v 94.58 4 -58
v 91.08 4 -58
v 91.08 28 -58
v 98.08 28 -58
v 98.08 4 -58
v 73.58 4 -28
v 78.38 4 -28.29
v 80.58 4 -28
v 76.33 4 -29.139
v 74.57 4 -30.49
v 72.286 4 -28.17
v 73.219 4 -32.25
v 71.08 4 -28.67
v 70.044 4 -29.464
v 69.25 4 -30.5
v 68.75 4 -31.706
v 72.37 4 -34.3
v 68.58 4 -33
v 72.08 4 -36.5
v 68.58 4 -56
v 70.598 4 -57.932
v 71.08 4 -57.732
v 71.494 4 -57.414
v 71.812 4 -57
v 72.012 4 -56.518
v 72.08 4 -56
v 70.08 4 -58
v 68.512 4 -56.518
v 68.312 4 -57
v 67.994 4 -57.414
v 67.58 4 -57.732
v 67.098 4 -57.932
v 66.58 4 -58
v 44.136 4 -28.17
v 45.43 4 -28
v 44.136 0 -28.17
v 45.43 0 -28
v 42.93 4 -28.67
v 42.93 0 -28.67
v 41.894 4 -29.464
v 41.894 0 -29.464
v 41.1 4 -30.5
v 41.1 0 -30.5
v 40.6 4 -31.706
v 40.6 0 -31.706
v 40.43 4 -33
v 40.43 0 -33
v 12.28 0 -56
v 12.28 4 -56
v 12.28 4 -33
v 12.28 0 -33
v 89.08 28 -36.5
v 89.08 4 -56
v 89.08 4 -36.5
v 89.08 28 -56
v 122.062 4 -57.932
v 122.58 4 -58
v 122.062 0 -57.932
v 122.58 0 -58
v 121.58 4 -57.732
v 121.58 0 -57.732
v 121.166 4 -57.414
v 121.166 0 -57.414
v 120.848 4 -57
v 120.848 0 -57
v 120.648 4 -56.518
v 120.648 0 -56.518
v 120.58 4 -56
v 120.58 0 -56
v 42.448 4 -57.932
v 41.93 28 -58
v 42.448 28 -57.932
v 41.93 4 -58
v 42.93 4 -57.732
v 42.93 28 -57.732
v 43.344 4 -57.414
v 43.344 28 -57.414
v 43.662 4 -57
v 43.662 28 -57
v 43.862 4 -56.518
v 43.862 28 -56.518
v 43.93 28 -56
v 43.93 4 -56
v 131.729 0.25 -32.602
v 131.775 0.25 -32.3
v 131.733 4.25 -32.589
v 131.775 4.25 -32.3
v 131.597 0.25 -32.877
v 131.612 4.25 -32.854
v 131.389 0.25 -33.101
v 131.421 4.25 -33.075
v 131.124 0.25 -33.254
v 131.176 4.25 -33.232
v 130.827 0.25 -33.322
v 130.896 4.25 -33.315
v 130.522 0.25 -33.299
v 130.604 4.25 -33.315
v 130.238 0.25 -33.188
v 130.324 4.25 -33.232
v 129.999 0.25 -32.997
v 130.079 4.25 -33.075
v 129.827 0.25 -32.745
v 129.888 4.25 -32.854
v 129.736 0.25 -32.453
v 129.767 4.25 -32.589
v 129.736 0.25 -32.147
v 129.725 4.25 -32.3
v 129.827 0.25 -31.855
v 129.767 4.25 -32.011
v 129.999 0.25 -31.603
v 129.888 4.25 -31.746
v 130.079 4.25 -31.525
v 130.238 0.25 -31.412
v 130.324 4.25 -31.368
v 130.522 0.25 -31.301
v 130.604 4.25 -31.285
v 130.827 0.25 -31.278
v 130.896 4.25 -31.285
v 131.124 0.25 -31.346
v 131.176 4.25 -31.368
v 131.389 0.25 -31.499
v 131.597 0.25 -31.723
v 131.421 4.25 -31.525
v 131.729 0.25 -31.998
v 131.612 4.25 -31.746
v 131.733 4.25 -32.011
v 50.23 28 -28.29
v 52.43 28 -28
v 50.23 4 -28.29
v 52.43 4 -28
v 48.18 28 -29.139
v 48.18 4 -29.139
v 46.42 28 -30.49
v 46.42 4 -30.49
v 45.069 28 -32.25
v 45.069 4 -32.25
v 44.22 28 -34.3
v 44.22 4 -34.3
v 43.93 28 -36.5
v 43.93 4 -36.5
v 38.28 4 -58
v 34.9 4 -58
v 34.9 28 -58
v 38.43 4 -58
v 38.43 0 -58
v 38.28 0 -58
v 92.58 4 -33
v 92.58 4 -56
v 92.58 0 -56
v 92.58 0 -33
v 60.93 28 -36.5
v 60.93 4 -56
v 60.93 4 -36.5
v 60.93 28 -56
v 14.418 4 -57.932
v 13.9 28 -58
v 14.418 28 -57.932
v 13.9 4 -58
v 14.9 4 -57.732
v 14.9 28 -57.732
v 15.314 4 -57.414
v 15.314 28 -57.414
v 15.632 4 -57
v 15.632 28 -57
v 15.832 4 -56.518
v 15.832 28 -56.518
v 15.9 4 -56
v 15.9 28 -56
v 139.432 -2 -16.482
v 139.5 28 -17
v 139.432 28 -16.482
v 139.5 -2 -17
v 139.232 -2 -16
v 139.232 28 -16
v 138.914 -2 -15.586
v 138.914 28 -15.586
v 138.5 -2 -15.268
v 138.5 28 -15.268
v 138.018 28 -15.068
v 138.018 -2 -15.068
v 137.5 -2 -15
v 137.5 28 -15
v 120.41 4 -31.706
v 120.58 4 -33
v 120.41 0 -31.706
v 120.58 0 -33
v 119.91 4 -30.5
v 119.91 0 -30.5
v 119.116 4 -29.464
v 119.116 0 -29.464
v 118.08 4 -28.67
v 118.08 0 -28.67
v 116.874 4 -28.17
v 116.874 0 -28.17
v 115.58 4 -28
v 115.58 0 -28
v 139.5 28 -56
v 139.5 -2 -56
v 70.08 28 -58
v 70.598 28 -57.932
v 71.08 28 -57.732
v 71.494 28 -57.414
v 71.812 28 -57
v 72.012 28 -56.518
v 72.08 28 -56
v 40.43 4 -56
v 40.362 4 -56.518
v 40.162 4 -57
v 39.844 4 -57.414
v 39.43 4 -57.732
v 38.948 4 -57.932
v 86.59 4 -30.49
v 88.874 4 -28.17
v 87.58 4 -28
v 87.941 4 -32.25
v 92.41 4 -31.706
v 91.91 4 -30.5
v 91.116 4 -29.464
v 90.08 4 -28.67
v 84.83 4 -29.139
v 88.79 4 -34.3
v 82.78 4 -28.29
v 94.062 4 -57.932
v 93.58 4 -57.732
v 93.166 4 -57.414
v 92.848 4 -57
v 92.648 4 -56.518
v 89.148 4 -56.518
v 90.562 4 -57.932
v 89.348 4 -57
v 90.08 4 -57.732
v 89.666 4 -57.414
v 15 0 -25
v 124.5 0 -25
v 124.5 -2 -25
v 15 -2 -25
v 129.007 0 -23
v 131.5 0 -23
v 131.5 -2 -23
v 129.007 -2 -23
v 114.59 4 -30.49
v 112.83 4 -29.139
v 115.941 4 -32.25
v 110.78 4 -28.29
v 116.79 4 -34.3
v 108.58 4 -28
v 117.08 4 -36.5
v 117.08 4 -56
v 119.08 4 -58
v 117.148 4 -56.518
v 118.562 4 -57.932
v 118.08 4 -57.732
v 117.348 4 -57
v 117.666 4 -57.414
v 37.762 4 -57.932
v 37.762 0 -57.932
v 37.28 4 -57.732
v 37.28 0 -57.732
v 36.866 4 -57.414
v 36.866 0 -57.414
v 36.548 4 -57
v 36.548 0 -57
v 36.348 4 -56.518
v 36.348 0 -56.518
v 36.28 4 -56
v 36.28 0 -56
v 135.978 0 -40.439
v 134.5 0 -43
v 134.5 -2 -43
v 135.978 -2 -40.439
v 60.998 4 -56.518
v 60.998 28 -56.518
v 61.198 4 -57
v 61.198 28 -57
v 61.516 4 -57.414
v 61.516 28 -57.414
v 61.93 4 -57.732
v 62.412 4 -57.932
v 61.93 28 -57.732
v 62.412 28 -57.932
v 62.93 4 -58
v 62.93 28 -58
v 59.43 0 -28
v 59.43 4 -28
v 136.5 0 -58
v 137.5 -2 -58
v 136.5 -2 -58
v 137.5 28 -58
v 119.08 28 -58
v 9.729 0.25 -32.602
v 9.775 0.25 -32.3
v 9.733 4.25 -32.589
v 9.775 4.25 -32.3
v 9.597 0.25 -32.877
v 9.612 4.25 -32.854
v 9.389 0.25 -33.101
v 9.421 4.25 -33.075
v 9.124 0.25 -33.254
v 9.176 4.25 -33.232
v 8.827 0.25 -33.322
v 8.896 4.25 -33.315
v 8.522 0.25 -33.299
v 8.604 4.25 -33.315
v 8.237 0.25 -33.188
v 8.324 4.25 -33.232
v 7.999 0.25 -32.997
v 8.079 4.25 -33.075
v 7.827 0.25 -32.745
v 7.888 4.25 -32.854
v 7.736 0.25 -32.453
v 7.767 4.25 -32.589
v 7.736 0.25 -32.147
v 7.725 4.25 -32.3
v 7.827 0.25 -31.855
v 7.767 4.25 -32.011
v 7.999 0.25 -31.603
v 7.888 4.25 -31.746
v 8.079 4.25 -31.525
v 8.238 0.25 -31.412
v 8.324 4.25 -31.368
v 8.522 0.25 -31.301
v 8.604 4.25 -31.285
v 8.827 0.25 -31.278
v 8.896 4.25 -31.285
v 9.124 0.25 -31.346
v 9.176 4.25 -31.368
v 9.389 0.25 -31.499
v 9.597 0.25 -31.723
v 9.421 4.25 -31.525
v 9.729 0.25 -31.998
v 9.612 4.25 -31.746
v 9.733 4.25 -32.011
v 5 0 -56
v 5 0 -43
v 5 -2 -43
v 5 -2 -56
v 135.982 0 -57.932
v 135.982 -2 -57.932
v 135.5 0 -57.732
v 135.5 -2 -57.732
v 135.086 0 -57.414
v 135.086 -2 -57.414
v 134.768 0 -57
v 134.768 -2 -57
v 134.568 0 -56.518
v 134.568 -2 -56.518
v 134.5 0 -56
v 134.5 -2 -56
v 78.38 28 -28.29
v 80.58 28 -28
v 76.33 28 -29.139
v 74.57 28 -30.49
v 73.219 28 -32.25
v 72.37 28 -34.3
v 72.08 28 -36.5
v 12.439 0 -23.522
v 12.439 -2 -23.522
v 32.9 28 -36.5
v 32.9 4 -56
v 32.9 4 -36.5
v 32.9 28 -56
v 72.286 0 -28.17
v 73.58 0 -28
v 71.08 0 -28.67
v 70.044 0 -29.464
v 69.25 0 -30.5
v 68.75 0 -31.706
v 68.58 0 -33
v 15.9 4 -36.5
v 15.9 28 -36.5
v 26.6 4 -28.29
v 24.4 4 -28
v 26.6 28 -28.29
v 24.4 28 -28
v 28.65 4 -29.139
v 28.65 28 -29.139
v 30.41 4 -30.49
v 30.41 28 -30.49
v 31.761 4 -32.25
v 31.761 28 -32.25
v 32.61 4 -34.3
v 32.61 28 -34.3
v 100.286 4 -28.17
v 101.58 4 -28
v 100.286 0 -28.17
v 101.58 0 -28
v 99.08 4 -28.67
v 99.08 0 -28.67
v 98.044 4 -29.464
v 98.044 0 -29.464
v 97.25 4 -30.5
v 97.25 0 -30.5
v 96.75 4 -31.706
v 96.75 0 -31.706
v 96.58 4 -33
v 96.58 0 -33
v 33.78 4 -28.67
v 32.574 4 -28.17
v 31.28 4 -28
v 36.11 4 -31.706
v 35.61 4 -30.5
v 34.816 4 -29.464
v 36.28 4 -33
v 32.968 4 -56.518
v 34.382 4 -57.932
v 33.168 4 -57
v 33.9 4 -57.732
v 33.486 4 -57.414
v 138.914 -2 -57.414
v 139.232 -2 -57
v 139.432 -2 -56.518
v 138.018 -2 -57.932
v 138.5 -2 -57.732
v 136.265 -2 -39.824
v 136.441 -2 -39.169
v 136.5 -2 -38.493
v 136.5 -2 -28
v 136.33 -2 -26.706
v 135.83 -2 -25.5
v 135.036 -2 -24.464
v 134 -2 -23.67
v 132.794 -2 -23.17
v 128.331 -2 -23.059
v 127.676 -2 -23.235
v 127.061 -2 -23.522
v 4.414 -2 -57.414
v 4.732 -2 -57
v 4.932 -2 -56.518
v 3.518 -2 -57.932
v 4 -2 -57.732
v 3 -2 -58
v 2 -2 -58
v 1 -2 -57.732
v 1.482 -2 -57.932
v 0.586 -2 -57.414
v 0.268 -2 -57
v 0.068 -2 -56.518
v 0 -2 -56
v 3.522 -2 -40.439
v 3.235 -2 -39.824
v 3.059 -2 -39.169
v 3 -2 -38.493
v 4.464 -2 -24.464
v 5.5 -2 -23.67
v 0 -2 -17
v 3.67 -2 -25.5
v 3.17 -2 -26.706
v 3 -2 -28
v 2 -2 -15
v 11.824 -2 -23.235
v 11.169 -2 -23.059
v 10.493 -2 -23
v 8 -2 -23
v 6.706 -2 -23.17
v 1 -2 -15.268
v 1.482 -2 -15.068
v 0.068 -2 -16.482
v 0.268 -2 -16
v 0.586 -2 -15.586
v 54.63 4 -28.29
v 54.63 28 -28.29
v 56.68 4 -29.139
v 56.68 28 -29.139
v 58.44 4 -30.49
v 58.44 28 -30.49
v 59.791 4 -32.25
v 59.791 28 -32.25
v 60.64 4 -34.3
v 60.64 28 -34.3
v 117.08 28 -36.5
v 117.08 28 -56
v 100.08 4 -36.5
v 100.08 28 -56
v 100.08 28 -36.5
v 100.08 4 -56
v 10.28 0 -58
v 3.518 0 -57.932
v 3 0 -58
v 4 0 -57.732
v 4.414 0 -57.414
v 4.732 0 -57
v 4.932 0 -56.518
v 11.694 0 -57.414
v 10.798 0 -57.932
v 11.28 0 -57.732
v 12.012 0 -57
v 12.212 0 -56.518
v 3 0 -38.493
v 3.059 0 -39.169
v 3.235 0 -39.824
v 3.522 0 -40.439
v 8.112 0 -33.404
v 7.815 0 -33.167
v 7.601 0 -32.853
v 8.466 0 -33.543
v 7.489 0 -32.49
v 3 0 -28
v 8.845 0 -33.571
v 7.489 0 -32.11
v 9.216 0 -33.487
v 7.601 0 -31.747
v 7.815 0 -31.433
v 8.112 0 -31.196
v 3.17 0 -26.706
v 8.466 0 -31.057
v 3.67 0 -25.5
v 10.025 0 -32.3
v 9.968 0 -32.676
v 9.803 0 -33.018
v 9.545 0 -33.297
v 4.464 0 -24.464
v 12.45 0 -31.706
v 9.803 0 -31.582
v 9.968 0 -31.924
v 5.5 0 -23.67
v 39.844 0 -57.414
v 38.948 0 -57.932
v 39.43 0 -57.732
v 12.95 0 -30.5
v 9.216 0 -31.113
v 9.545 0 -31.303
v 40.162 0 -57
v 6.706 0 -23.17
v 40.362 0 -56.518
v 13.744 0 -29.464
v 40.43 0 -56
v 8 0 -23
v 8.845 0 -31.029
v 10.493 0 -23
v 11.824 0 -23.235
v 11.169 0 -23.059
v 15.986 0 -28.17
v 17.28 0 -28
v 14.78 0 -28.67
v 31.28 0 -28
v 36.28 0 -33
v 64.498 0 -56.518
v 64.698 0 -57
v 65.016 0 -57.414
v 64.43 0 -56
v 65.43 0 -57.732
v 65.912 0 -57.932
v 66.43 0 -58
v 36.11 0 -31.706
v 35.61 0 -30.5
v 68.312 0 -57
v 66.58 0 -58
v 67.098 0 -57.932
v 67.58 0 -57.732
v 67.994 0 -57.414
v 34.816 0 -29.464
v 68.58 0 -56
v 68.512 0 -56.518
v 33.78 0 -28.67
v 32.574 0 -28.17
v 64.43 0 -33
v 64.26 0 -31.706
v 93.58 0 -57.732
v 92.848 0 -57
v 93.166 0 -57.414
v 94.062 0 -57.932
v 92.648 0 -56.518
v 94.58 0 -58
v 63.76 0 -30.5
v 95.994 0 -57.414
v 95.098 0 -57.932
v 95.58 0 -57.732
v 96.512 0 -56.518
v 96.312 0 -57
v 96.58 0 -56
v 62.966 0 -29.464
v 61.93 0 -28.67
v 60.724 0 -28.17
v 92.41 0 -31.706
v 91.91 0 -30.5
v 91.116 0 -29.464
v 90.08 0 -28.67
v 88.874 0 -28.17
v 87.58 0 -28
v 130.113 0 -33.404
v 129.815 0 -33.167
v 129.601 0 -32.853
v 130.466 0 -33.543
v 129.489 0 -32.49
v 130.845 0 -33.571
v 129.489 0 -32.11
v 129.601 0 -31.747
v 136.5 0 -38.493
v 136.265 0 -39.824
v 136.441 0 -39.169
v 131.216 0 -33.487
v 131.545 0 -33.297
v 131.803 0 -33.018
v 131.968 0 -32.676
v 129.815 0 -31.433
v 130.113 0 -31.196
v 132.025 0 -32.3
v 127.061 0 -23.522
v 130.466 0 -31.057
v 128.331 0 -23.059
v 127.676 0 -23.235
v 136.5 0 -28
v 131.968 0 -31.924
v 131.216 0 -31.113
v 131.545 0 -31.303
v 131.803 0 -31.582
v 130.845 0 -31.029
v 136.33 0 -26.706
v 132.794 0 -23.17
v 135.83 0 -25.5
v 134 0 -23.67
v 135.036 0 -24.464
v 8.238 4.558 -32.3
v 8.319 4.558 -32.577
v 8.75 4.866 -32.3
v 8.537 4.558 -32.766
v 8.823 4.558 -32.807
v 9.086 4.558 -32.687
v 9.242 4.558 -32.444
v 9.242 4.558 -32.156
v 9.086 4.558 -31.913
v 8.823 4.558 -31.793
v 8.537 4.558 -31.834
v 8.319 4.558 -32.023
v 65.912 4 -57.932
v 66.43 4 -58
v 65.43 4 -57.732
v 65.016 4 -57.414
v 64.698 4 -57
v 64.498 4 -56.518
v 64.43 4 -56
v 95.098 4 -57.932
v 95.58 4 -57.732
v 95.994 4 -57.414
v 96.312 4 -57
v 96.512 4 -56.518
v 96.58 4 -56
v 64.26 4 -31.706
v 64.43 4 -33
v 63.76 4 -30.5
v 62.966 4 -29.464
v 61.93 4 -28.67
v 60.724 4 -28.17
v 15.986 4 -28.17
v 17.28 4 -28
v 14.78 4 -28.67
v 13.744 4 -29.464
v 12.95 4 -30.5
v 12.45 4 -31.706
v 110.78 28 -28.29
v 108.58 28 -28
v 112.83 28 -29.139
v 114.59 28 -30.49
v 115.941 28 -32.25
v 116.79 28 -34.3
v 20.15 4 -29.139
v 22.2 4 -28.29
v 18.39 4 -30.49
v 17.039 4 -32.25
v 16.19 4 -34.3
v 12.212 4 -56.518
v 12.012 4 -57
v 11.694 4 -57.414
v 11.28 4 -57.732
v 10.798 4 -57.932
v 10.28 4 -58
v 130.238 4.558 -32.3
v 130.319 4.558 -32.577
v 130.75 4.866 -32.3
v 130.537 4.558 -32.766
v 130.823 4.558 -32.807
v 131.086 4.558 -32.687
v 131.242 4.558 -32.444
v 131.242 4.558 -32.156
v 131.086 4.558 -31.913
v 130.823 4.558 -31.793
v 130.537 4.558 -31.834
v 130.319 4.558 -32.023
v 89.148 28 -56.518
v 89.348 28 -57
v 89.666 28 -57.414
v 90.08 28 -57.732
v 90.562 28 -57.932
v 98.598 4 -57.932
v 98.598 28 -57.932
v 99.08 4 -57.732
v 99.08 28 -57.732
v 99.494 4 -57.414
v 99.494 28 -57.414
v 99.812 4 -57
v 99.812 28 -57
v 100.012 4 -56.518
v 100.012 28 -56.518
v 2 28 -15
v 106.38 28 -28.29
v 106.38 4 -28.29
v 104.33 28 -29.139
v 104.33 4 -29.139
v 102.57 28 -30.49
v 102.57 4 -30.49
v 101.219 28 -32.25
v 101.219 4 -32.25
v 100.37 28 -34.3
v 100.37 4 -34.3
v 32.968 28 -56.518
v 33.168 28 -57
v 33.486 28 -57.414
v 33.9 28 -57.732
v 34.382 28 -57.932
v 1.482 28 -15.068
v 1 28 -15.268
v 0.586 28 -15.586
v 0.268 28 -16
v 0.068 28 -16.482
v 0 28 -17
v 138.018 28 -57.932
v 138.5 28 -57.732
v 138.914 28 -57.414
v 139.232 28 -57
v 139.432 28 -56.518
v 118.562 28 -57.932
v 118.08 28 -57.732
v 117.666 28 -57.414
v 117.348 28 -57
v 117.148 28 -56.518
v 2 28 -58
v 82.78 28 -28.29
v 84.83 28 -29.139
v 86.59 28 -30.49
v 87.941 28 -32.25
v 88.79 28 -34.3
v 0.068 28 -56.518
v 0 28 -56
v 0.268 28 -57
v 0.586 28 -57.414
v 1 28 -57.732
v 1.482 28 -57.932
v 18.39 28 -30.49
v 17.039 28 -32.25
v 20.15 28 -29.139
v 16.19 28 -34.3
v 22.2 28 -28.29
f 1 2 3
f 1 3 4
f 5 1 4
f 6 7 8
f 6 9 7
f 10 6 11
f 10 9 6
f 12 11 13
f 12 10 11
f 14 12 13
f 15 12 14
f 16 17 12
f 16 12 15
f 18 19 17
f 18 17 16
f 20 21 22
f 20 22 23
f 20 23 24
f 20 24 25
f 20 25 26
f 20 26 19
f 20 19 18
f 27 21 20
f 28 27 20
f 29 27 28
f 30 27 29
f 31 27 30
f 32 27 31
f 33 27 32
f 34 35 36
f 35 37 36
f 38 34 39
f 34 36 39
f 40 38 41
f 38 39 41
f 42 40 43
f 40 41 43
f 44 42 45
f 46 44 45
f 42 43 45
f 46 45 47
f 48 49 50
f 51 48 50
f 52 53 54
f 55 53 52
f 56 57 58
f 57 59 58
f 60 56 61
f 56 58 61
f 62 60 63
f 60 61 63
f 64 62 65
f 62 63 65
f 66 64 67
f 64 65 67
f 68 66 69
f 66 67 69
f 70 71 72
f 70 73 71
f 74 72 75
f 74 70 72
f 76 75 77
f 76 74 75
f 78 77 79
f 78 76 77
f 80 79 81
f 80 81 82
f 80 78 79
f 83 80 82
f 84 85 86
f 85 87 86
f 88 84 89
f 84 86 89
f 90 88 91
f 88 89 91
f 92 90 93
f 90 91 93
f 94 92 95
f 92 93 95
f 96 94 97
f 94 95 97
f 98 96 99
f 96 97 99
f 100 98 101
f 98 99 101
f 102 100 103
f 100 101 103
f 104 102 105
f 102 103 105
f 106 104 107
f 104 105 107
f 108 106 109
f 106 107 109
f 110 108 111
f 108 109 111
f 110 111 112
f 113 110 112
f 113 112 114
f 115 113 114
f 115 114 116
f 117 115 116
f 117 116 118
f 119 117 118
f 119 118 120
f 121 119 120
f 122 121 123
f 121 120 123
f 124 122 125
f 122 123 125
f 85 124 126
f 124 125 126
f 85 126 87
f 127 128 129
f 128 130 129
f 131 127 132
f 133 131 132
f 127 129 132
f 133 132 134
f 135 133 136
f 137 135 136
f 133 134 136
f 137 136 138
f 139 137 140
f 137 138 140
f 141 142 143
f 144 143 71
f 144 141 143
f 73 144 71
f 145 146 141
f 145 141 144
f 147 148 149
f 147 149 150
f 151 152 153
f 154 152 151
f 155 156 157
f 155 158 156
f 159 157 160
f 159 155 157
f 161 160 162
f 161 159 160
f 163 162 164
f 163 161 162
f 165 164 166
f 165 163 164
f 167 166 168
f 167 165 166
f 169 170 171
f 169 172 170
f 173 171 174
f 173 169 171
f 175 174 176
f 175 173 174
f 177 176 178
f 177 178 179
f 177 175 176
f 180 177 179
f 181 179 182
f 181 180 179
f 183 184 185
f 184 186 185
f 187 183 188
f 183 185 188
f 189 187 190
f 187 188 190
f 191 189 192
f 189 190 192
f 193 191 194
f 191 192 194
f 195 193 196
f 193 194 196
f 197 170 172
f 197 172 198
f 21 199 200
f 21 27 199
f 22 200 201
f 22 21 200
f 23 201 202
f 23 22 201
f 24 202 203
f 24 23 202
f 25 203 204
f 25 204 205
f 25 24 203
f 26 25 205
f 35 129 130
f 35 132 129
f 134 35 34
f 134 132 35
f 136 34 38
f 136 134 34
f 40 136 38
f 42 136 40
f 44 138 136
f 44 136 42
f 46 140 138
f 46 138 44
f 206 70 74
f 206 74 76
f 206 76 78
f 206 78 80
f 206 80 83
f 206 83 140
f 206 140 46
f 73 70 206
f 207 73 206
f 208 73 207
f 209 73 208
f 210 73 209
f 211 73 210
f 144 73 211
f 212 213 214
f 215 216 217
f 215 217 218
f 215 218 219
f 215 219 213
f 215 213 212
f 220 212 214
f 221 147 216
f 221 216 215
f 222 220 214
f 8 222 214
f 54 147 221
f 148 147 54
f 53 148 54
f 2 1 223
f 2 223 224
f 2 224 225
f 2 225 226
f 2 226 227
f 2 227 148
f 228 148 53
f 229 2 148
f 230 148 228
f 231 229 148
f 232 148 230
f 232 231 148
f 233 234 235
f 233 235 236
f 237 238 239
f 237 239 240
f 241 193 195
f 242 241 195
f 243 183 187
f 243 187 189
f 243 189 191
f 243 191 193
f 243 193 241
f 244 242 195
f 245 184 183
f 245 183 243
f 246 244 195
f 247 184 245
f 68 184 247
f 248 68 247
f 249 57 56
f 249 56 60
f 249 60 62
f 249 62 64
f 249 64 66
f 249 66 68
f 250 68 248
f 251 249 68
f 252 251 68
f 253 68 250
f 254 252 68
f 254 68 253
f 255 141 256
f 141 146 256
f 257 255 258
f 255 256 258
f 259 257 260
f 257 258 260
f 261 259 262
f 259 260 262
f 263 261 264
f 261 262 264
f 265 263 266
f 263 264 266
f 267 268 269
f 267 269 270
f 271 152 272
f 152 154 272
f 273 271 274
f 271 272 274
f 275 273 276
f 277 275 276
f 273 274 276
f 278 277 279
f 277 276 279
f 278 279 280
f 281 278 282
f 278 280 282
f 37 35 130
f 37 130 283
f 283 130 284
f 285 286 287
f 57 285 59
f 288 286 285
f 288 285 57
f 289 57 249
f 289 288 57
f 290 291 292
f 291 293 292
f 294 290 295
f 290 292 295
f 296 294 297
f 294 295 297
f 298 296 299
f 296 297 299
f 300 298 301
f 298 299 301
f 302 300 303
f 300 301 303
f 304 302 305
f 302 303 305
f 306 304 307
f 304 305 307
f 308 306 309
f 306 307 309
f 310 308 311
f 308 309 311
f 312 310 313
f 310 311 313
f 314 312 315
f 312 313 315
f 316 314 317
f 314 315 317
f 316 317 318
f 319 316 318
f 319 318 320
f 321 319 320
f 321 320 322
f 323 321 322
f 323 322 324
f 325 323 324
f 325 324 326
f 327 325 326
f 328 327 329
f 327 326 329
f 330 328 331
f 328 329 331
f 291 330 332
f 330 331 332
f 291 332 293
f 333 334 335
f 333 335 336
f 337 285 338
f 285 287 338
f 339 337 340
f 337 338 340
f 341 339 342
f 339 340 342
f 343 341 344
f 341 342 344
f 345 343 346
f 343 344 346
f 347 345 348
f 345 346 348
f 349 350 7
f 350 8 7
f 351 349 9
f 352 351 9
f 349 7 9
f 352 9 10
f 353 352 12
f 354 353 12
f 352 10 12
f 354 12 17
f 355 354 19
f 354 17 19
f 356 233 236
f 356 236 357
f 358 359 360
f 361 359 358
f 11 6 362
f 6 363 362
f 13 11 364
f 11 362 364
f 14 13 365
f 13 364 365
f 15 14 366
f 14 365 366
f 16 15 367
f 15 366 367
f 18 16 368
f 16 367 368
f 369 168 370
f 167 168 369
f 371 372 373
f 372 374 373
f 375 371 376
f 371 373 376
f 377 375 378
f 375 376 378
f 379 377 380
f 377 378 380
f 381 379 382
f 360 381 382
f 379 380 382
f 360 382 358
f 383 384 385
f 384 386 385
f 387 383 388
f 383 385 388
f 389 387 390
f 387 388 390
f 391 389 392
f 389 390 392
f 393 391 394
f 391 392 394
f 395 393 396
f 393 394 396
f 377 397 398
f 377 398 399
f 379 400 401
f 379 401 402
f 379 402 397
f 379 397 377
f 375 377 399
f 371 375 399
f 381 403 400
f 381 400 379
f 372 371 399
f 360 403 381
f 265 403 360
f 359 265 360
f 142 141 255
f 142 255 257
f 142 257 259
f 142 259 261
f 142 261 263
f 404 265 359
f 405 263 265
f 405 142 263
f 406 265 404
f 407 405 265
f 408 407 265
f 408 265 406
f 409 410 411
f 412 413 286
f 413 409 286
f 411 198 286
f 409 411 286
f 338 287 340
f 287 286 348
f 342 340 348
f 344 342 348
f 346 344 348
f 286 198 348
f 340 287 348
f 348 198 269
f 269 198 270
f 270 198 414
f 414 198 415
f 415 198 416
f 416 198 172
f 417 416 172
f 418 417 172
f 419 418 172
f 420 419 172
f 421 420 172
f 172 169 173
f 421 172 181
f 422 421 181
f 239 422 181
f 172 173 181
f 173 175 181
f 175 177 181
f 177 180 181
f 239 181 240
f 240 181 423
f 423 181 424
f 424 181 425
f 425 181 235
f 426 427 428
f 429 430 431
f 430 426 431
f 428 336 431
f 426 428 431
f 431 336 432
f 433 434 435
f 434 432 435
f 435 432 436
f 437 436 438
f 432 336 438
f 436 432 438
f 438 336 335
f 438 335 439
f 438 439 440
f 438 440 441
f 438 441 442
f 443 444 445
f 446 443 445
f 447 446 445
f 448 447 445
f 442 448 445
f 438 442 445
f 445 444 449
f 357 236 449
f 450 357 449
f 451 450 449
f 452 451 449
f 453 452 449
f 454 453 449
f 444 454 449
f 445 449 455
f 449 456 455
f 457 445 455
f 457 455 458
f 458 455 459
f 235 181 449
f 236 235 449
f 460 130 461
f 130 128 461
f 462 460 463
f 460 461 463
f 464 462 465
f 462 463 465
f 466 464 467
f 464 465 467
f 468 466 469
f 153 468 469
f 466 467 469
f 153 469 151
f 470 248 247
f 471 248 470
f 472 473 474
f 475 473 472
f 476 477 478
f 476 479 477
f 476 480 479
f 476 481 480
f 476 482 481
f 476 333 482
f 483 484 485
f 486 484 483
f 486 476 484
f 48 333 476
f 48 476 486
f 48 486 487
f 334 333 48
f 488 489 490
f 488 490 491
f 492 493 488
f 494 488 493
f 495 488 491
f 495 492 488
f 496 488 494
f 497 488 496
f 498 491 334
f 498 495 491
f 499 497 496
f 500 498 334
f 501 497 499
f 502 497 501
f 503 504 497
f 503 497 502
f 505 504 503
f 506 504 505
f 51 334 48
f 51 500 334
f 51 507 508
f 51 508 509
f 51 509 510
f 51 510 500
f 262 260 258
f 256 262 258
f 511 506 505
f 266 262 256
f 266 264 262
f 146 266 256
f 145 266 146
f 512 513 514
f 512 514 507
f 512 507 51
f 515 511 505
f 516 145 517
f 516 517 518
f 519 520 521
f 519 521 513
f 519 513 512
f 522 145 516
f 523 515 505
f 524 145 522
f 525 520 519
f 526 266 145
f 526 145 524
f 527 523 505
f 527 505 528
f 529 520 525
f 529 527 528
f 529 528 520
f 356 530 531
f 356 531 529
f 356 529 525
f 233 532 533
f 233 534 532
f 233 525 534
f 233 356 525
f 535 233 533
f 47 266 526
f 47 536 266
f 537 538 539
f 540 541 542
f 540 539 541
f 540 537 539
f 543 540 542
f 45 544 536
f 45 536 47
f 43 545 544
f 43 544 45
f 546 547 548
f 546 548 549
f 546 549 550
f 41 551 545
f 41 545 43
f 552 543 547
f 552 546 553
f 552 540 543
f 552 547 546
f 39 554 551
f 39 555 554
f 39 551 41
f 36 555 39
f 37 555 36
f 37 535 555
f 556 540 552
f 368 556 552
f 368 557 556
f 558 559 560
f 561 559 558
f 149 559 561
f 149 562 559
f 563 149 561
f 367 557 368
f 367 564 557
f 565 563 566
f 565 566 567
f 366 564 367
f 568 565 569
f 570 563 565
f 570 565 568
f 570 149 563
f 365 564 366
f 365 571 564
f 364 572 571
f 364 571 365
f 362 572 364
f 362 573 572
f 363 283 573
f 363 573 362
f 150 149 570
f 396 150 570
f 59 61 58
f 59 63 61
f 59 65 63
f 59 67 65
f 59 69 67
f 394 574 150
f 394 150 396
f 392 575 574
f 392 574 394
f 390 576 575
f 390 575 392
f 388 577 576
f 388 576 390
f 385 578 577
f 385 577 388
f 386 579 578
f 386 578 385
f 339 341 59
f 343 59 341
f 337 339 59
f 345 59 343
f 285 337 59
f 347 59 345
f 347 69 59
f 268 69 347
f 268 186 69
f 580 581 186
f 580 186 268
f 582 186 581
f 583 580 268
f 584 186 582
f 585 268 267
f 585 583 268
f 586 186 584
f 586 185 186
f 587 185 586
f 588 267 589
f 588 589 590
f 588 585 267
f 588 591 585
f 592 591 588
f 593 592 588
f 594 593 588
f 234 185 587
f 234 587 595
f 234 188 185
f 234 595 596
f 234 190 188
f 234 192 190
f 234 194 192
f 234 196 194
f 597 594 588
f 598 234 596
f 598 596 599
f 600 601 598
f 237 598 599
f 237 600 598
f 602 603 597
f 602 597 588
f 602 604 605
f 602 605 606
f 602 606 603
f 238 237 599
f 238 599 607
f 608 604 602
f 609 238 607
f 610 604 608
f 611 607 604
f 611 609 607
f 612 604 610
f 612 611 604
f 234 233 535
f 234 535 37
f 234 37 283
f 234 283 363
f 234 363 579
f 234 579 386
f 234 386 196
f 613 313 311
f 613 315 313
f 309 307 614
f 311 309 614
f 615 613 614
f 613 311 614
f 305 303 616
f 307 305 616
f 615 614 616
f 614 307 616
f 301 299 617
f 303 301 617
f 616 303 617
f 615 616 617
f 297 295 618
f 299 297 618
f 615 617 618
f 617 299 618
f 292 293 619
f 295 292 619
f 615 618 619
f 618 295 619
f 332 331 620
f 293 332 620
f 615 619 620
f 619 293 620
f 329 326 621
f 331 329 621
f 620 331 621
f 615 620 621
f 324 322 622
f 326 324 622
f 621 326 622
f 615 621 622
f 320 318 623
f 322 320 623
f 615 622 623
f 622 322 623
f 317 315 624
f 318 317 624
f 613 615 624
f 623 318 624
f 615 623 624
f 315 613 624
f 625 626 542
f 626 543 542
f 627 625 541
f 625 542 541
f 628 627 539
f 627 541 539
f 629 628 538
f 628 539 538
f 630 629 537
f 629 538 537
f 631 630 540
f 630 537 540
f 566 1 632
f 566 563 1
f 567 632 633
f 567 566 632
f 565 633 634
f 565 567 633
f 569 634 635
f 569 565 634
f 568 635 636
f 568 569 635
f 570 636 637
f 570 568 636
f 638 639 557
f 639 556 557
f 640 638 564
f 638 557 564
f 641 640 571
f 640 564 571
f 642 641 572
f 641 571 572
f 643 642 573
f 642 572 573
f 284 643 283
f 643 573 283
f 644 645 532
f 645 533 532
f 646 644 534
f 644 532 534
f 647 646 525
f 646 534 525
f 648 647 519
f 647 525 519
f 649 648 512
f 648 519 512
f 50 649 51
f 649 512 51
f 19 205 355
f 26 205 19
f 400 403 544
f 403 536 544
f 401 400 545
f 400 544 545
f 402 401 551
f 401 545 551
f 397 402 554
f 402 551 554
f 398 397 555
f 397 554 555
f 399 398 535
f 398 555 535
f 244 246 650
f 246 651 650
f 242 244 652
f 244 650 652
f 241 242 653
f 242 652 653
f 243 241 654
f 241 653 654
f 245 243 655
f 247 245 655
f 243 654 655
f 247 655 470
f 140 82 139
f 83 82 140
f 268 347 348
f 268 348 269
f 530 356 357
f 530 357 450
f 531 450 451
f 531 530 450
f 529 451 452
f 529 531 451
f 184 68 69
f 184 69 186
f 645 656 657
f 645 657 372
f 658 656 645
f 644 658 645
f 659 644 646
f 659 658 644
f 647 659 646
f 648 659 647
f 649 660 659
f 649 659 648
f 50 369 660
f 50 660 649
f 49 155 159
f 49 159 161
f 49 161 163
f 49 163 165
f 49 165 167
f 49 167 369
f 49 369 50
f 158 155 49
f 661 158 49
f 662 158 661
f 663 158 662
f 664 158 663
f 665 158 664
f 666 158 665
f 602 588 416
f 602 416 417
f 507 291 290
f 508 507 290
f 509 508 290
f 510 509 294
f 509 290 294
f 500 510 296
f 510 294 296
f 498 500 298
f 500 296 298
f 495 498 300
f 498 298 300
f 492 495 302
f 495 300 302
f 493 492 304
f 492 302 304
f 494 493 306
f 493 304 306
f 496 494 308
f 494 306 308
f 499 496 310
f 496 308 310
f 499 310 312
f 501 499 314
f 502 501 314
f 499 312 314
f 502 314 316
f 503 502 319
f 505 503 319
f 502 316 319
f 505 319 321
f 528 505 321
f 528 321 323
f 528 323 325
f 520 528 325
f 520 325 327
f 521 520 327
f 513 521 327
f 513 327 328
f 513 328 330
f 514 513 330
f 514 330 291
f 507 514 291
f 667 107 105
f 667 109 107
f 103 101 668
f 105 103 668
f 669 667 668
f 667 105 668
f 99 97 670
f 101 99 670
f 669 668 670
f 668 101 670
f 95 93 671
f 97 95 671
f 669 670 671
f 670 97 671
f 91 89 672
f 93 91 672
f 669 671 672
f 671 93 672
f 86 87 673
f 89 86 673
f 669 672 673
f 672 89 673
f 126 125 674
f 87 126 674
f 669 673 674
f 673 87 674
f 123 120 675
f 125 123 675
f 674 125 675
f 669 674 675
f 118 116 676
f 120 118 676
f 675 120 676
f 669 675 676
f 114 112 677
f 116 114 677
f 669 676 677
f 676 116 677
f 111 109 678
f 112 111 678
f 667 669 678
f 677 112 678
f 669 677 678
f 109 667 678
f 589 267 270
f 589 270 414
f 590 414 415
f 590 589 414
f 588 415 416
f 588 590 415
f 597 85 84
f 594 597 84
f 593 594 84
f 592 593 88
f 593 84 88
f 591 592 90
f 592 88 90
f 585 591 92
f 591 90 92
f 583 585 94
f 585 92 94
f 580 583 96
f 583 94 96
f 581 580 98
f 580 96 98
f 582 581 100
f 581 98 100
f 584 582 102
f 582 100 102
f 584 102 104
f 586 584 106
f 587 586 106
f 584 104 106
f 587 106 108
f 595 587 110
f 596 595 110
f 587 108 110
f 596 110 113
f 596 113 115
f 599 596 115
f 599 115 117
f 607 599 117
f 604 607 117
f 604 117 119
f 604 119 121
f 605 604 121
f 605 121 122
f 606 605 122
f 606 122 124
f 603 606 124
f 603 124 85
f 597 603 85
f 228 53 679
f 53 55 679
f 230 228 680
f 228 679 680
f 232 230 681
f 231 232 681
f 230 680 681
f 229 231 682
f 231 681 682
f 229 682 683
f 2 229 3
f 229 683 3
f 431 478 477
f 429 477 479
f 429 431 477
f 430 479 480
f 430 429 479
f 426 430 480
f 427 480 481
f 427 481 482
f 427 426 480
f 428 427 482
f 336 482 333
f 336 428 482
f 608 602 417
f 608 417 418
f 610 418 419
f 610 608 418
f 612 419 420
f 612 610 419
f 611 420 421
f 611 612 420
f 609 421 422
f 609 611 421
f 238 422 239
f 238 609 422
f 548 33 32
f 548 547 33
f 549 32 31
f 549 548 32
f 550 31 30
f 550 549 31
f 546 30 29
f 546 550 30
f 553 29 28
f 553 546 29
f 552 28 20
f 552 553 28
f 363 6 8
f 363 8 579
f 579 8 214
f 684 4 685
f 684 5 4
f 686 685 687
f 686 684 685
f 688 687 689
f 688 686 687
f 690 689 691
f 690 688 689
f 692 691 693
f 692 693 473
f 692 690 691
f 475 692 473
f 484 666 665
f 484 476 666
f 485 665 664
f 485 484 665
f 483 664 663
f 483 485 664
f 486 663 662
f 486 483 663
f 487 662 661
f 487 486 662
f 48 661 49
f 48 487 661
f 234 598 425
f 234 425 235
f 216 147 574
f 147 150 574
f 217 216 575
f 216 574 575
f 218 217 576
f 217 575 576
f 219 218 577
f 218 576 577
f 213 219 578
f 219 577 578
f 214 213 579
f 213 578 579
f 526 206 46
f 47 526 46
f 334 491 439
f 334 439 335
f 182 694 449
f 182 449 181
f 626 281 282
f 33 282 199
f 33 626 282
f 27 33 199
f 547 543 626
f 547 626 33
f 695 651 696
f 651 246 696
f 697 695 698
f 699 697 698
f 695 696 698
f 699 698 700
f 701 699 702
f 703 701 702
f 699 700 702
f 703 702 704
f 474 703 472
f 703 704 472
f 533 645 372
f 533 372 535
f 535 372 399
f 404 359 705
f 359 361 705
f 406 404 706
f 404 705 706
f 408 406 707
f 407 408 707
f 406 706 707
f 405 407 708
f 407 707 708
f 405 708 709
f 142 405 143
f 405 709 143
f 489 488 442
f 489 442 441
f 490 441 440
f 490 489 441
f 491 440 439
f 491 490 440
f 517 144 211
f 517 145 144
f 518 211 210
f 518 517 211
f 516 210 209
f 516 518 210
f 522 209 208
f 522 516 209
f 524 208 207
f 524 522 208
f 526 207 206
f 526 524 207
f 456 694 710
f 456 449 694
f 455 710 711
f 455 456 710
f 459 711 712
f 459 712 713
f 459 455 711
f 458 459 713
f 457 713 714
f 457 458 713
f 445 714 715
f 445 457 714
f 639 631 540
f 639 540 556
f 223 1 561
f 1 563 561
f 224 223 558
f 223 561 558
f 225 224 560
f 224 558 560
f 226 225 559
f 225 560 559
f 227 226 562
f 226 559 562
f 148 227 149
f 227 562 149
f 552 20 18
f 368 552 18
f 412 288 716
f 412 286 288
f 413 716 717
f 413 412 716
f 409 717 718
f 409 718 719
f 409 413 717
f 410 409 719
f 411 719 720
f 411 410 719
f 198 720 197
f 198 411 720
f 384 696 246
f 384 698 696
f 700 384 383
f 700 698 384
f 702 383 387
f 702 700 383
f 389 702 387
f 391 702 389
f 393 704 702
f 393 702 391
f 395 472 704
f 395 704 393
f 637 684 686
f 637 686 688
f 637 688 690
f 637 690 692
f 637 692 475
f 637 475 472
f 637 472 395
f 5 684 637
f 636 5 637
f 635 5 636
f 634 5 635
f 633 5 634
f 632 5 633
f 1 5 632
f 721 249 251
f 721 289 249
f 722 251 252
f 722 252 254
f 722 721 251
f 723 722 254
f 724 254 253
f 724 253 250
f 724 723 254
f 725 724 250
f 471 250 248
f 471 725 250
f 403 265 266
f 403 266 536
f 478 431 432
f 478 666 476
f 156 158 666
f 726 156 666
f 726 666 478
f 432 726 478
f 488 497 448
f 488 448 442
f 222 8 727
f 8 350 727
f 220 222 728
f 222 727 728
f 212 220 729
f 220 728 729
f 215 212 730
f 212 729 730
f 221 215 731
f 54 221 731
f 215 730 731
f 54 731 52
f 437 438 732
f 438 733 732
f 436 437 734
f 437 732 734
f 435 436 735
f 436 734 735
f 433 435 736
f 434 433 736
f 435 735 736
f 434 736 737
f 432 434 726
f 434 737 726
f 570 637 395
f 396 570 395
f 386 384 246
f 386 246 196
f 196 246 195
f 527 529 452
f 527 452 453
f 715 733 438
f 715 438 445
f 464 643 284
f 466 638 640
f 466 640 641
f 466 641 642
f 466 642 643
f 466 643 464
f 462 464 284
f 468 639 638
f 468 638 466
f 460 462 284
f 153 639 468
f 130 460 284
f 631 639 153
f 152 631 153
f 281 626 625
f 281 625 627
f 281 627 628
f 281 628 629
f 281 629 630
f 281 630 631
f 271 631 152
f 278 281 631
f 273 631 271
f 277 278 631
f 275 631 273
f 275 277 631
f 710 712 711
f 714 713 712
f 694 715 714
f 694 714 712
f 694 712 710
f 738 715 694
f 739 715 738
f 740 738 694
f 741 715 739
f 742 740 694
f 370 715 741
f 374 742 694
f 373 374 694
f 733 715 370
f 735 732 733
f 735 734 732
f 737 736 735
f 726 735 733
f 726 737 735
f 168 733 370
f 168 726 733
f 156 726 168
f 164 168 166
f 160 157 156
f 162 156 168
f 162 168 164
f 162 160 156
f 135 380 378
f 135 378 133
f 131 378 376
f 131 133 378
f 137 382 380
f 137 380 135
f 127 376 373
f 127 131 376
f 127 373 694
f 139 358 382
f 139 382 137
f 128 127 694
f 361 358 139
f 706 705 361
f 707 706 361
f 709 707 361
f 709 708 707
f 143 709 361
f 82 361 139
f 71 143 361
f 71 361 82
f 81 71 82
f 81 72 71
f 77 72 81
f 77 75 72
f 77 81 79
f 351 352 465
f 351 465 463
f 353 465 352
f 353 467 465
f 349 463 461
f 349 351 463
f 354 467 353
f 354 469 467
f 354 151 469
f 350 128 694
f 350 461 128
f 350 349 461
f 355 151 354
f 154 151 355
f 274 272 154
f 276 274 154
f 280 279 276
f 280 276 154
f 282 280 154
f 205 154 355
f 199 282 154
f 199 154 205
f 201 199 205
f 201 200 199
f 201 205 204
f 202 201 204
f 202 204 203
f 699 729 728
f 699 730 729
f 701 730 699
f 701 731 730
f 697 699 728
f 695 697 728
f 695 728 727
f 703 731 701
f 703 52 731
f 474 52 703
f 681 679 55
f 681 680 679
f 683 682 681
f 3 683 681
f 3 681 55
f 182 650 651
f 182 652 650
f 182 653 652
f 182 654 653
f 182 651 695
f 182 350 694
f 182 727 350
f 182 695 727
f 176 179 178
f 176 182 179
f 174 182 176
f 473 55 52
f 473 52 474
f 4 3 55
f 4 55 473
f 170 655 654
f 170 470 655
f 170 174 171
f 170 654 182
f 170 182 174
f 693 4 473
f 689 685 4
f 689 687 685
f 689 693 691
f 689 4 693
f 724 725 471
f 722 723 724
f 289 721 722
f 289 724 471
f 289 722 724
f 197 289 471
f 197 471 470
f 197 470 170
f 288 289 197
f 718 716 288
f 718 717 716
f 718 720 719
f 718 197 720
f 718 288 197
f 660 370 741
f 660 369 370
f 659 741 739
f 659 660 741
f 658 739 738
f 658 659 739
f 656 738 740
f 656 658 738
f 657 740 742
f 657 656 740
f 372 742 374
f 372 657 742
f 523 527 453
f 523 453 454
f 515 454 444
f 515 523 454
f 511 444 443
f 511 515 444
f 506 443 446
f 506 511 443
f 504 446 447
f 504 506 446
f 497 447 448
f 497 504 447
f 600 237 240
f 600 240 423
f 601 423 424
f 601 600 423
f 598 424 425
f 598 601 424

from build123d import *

# Parameters (mm, degrees)
SKIZZE1_W                        = 139.5
SKIZZE1_H                        = 58
AUFSATZ_LINEAR_AUSTRAGEN1_DEPTH  = 28
SCHNITT_LINEAR_AUSTRAGEN2_DEPTH  = 30
VERRUNDUNG1_R                    = 8.5
SKIZZE5_W                        = 7.28
SKIZZE5_H                        = 30
SKIZZE5_W_2                      = 4
SKIZZE5_W_3                      = 4.15
SKIZZE5_W_4                      = 13.92
AUFSATZ_LINEAR_AUSTRAGEN2_DEPTH  = 4
VERRUNDUNG2_R                    = 5
AUFSATZ_LINEAR_AUSTRAGEN3_DEPTH  = 2
VERRUNDUNG3_R                    = 2
VERRUNDUNG4_R                    = 2
SKIZZE7_W                        = 139.5
SKIZZE7_H                        = 15
SCHNITT_LINEAR_AUSTRAGEN5_DEPTH  = 155.026783385
VERRUNDUNG5_R                    = 2
M2_5_GEWINDEBOHRUNG1_D           = 2.05
M2_5_GEWINDEBOHRUNG1_DEPTH       = 4.25
M2_5_GEWINDEBOHRUNG1_CSINK_D     = 2.55
M2_5_GEWINDEBOHRUNG1_CSINK_ANGLE = 90
M2_5_GEWINDEBOHRUNG1_TIP         = 0.615882135


with BuildPart() as part:
    # Skizze1 → Aufsatz-Linear austragen1 (new body)
    with BuildSketch(Plane(origin=(0, 0, 0), x_dir=(1, 0, 0), z_dir=(0, 1, 0))):
        with Locations((69.75, 29)):
            Rectangle(SKIZZE1_W, SKIZZE1_H)
    extrude(amount=AUFSATZ_LINEAR_AUSTRAGEN1_DEPTH)

    # Skizze4 → Schnitt-Linear austragen2 (cut)
    with BuildSketch(Plane(origin=(0, 0, -58), x_dir=(-1, 0, 0), z_dir=(0, 0, -1))):
        Polygon((-3.63, 0), (-80.58, 0), (-134.5, 0), (-134.5, 4), (-117.08, 4), (-117.08, 28), (-108.58, 28), (-100.08, 28), (-100.08, 4), (-89.08, 4), (-89.08, 28), (-72.08, 28), (-72.08, 4), (-60.93, 4), (-60.93, 28), (-43.93, 28), (-43.93, 4), (-32.9, 4), (-32.9, 28), (-15.9, 28), (-15.9, 4), (-5, 4), (-5, 0), align=None)
    extrude(amount=-SCHNITT_LINEAR_AUSTRAGEN2_DEPTH, mode=Mode.SUBTRACT)

    # Verrundung1
    verrundung1_edges = [part.edges().sort_by_distance(p)[0] for p in [
        (15.9, 16, -28),
        (32.9, 16, -28),
        (43.93, 16, -28),
        (60.93, 16, -28),
        (72.08, 16, -28),
        (89.08, 16, -28),
        (100.08, 16, -28),
        (117.08, 16, -28),
    ]]
    fillet(verrundung1_edges, radius=VERRUNDUNG1_R - 0.0001)  # a hair under: the kernel refuses the full size

    # Skizze5 → Aufsatz-Linear austragen2 (add)
    with BuildSketch(Plane.XZ.offset(-4)):
        with Locations((8.64, -43)):
            Rectangle(SKIZZE5_W, SKIZZE5_H)
        with Locations((94.58, -43)):
            Rectangle(SKIZZE5_W_2, SKIZZE5_H)
        with Locations((66.505, -43)):
            Rectangle(SKIZZE5_W_3, SKIZZE5_H)
        with Locations((38.355, -43)):
            Rectangle(SKIZZE5_W_3, SKIZZE5_H)
        with Locations((127.54, -43)):
            Rectangle(SKIZZE5_W_4, SKIZZE5_H)
    extrude(amount=AUFSATZ_LINEAR_AUSTRAGEN2_DEPTH)

    # Verrundung2
    verrundung2_edges = [part.edges().sort_by_distance(p)[0] for p in [
        (12.28, 2, -28),
        (96.58, 2, -28),
        (92.58, 2, -28),
        (68.58, 2, -28),
        (64.43, 2, -28),
        (120.58, 2, -28),
        (40.43, 2, -28),
        (36.28, 2, -28),
    ]]
    fillet(verrundung2_edges, radius=VERRUNDUNG2_R)

    # Skizze6 → Aufsatz-Linear austragen3 (add)
    with BuildSketch(Plane.XZ):
        with BuildLine():
            Line((139.5, -58), (134.5, -58))
            Line((134.5, -58), (134.5, -43))
            Line((134.5, -43), (135.978342998, -40.439434817))
            ThreePointArc((135.978342998, -40.439434817), (136.36732536, -39.500348322), (136.5, -38.492584381))
            Line((136.5, -38.492584381), (136.5, -28))
            ThreePointArc((136.5, -28), (135.035533906, -24.464466094), (131.5, -23))
            Line((131.5, -23), (129.007415619, -23))
            ThreePointArc((129.007415619, -23), (127.999651678, -23.13267464), (127.060565183, -23.521657002))
            Line((127.060565183, -23.521657002), (124.5, -25))
            Line((124.5, -25), (15, -25))
            Line((15, -25), (12.439434817, -23.521657002))
            ThreePointArc((12.439434817, -23.521657002), (11.500348322, -23.13267464), (10.492584381, -23))
            Line((10.492584381, -23), (8, -23))
            ThreePointArc((8, -23), (4.464466094, -24.464466094), (3, -28))
            Line((3, -28), (3, -38.492584381))
            ThreePointArc((3, -38.492584381), (3.13267464, -39.500348322), (3.521657002, -40.439434817))
            Line((3.521657002, -40.439434817), (5, -43))
            Line((5, -43), (5, -58))
            Line((5, -58), (0, -58))
            Line((0, -58), (0, 0))
            Line((0, 0), (139.5, 0))
            Line((139.5, 0), (139.5, -58))
        make_face()
    extrude(amount=AUFSATZ_LINEAR_AUSTRAGEN3_DEPTH)

    # Verrundung3
    verrundung3_edges = [part.edges().sort_by_distance(p)[0] for p in [
        (117.08, 16, -58),
        (100.08, 16, -58),
        (72.08, 16, -58),
        (43.93, 16, -58),
        (15.9, 16, -58),
        (32.9, 16, -58),
        (60.93, 16, -58),
        (89.08, 16, -58),
        (0, 13, -58),
        (139.5, 13, -58),
        (139.5, 13, 0),
        (0, 13, 0),
    ]]
    fillet(verrundung3_edges, radius=VERRUNDUNG3_R)

    # Verrundung4
    verrundung4_edges = [part.edges().sort_by_distance(p)[0] for p in [
        (12.28, 2, -58),
        (96.58, 2, -58),
        (92.58, 2, -58),
        (68.58, 2, -58),
        (64.43, 2, -58),
        (120.58, 2, -58),
        (40.43, 2, -58),
        (36.28, 2, -58),
        (5, -1, -58),
        (134.5, -1, -58),
    ]]
    fillet(verrundung4_edges, radius=VERRUNDUNG4_R - 0.0001)  # a hair under: the kernel refuses the full size

    # Skizze7 → Schnitt-Linear austragen5 (cut, through all)
    with BuildSketch(Plane(origin=(0, 28, 0), x_dir=(1, 0, 0), z_dir=(0, 1, 0))):
        with Locations((69.75, 7.5)):
            Rectangle(SKIZZE7_W, SKIZZE7_H)
    extrude(amount=-SCHNITT_LINEAR_AUSTRAGEN5_DEPTH, mode=Mode.SUBTRACT)

    # Verrundung5
    verrundung5_edges = [part.edges().sort_by_distance(p)[0] for p in [
        (139.5, 13, -15),
        (0, 13, -15),
    ]]
    fillet(verrundung5_edges, radius=VERRUNDUNG5_R)

    # M2.5 Gewindebohrung1
    with Locations(Plane(origin=(0, 0, 0), x_dir=(-1, 0, 0), z_dir=(0, -1, 0))):
        with Locations((-130.75, 32.3), (-8.75, 32.3)):
            CounterSinkHole(M2_5_GEWINDEBOHRUNG1_D / 2, M2_5_GEWINDEBOHRUNG1_CSINK_D / 2, depth=M2_5_GEWINDEBOHRUNG1_DEPTH, counter_sink_angle=M2_5_GEWINDEBOHRUNG1_CSINK_ANGLE)
            with Locations((0, 0, -(M2_5_GEWINDEBOHRUNG1_DEPTH + M2_5_GEWINDEBOHRUNG1_TIP / 2))):  # 118° drill point
                Cone(0, M2_5_GEWINDEBOHRUNG1_D / 2, M2_5_GEWINDEBOHRUNG1_TIP, mode=Mode.SUBTRACT)


solid = part.part
